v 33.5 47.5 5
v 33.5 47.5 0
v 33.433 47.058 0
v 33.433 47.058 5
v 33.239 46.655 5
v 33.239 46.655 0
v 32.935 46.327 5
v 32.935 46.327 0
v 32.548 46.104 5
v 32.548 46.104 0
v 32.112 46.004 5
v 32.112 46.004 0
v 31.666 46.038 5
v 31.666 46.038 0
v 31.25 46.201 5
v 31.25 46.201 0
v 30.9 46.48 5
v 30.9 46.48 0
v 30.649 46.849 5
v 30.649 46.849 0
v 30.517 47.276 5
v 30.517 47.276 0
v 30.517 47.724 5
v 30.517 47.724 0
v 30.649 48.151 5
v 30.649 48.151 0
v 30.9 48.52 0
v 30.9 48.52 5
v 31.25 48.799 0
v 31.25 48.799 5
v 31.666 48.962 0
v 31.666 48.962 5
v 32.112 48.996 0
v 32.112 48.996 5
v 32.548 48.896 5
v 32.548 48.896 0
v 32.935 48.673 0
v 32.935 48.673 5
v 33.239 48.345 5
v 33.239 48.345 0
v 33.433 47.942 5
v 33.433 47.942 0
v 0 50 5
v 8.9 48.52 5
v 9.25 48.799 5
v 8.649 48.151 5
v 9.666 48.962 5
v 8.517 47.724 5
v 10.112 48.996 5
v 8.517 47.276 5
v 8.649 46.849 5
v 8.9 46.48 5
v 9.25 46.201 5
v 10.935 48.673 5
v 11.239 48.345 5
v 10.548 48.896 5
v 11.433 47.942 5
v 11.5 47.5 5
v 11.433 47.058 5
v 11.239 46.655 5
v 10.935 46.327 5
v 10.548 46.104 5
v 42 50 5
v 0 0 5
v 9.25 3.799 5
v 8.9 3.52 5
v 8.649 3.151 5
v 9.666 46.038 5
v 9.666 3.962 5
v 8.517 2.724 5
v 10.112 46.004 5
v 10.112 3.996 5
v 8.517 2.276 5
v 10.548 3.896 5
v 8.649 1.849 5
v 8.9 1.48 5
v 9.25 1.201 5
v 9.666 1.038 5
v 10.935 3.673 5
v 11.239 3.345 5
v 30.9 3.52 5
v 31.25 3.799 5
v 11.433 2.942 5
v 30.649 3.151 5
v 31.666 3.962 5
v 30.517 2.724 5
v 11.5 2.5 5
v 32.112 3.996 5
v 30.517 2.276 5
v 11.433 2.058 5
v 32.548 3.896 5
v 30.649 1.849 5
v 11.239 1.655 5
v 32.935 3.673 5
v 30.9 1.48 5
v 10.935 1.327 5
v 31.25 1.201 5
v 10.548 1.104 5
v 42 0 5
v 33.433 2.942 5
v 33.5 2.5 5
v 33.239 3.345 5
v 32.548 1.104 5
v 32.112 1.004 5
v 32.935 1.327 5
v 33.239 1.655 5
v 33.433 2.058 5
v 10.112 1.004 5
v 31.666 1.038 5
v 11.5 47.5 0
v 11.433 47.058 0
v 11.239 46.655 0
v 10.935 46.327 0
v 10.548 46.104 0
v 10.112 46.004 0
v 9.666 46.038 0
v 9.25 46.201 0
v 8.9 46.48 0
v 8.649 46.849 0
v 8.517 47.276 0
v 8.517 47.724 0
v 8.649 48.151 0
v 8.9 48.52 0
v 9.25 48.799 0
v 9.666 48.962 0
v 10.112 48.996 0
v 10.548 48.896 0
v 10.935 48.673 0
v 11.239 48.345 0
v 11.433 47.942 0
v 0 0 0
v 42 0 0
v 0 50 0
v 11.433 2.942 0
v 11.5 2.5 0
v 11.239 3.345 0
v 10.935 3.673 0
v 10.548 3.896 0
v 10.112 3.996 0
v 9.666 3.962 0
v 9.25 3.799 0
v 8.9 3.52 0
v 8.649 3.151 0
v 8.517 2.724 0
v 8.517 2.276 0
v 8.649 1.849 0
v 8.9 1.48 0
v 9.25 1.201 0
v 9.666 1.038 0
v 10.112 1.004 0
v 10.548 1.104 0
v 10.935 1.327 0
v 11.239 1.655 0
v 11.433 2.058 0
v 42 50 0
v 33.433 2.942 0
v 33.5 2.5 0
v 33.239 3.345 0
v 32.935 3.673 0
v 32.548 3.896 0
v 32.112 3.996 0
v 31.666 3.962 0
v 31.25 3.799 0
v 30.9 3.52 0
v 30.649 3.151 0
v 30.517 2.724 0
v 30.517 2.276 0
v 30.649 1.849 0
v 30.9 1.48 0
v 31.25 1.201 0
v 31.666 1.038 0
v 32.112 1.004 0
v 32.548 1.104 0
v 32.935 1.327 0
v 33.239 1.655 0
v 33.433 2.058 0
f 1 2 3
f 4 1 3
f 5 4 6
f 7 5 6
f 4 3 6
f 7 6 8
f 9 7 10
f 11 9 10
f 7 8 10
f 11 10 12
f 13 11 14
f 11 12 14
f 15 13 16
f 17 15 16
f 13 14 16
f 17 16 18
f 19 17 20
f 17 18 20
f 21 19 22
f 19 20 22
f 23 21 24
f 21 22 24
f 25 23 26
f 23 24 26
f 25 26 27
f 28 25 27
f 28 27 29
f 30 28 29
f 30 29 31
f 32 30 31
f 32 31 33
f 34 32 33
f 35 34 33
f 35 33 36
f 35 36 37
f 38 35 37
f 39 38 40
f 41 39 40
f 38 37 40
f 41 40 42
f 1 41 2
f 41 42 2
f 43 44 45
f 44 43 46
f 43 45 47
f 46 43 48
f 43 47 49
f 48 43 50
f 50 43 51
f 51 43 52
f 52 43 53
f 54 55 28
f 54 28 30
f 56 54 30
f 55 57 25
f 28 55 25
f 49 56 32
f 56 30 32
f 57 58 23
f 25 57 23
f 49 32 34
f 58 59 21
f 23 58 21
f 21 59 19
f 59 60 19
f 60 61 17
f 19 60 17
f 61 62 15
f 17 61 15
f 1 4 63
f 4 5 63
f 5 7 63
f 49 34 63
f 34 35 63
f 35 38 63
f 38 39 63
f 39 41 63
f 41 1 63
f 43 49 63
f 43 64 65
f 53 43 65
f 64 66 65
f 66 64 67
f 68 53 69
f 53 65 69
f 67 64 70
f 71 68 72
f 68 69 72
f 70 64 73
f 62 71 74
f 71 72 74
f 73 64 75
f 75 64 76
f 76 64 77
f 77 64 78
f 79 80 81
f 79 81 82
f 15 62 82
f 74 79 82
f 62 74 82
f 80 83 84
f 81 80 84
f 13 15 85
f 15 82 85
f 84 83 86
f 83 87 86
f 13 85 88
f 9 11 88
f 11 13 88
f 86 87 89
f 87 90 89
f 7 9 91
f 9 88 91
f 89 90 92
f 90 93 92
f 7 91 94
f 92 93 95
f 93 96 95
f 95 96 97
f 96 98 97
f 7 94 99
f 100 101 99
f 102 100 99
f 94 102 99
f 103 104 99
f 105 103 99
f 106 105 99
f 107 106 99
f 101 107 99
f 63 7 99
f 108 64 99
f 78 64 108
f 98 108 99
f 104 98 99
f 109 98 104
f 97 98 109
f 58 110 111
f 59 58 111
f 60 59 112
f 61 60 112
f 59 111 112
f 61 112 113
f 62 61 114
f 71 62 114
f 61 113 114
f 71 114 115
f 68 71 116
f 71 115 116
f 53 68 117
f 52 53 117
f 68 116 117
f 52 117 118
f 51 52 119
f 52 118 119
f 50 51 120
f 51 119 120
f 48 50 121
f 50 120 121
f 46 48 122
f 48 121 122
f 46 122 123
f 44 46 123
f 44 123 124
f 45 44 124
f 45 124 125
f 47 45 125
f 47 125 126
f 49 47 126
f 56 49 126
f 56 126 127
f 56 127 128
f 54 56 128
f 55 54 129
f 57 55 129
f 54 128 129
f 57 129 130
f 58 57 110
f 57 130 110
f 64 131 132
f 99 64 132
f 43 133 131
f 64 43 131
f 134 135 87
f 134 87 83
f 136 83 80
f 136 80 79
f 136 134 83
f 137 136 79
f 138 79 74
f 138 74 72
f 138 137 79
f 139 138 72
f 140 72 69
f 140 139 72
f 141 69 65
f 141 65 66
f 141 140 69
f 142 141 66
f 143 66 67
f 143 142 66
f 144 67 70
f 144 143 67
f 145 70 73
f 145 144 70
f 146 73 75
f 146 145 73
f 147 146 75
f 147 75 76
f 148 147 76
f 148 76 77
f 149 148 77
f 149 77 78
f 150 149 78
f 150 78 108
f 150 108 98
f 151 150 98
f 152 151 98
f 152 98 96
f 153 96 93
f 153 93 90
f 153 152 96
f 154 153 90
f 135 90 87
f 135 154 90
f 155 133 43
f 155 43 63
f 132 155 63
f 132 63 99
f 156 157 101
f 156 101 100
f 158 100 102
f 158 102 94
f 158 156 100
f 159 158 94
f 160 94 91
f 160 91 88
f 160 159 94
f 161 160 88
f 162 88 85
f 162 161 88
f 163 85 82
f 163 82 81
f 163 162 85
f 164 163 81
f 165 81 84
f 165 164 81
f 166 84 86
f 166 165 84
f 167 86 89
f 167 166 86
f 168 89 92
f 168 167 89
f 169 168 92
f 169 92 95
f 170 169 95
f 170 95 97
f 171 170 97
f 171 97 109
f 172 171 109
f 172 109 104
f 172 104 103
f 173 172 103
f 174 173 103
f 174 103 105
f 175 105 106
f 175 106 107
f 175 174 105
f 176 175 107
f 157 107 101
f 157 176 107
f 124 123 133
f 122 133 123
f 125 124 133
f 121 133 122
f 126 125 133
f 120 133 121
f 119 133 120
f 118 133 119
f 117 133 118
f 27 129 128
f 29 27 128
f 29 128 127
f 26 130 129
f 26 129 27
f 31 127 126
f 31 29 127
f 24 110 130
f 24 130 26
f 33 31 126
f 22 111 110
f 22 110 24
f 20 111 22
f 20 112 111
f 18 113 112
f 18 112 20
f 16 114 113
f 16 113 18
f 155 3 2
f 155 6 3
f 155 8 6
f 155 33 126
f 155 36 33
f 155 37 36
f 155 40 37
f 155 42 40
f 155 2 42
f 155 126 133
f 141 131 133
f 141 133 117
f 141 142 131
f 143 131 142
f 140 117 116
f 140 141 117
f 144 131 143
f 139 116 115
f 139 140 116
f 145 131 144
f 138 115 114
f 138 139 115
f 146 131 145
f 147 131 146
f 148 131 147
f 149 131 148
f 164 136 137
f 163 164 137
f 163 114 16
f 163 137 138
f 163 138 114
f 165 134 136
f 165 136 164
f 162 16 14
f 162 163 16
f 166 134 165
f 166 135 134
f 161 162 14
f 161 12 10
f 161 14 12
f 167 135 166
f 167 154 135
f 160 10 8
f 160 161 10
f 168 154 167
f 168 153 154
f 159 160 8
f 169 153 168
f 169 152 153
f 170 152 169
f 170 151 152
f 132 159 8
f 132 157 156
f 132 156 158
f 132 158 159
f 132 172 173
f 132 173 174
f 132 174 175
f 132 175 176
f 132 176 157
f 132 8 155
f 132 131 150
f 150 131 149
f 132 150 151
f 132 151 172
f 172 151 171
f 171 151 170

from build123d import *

# Parameters (mm, degrees)
SKETCH1_W           = 42
SKETCH1_H           = 25
SKETCH1_R           = 1.5
BOSS_EXTRUDE1_DEPTH = 5


with BuildPart() as part:
    # Sketch1 → Boss-Extrude1 (new body)
    with BuildSketch(Plane.XY):
        with Locations((21, 12.5)):
            Rectangle(SKETCH1_W, SKETCH1_H)
        with Locations((10, 2.5)):
            Circle(SKETCH1_R, mode=Mode.SUBTRACT)
        with Locations((32, 2.5)):
            Circle(SKETCH1_R, mode=Mode.SUBTRACT)
    boss_extrude1 = extrude(amount=BOSS_EXTRUDE1_DEPTH)

    # Mirror1: Boss-Extrude1 across plane
    add(boss_extrude1.mirror(Plane(origin=(0, 25, 5), x_dir=(0, 0, 1), z_dir=(0, -1, 0))))


solid = part.part
